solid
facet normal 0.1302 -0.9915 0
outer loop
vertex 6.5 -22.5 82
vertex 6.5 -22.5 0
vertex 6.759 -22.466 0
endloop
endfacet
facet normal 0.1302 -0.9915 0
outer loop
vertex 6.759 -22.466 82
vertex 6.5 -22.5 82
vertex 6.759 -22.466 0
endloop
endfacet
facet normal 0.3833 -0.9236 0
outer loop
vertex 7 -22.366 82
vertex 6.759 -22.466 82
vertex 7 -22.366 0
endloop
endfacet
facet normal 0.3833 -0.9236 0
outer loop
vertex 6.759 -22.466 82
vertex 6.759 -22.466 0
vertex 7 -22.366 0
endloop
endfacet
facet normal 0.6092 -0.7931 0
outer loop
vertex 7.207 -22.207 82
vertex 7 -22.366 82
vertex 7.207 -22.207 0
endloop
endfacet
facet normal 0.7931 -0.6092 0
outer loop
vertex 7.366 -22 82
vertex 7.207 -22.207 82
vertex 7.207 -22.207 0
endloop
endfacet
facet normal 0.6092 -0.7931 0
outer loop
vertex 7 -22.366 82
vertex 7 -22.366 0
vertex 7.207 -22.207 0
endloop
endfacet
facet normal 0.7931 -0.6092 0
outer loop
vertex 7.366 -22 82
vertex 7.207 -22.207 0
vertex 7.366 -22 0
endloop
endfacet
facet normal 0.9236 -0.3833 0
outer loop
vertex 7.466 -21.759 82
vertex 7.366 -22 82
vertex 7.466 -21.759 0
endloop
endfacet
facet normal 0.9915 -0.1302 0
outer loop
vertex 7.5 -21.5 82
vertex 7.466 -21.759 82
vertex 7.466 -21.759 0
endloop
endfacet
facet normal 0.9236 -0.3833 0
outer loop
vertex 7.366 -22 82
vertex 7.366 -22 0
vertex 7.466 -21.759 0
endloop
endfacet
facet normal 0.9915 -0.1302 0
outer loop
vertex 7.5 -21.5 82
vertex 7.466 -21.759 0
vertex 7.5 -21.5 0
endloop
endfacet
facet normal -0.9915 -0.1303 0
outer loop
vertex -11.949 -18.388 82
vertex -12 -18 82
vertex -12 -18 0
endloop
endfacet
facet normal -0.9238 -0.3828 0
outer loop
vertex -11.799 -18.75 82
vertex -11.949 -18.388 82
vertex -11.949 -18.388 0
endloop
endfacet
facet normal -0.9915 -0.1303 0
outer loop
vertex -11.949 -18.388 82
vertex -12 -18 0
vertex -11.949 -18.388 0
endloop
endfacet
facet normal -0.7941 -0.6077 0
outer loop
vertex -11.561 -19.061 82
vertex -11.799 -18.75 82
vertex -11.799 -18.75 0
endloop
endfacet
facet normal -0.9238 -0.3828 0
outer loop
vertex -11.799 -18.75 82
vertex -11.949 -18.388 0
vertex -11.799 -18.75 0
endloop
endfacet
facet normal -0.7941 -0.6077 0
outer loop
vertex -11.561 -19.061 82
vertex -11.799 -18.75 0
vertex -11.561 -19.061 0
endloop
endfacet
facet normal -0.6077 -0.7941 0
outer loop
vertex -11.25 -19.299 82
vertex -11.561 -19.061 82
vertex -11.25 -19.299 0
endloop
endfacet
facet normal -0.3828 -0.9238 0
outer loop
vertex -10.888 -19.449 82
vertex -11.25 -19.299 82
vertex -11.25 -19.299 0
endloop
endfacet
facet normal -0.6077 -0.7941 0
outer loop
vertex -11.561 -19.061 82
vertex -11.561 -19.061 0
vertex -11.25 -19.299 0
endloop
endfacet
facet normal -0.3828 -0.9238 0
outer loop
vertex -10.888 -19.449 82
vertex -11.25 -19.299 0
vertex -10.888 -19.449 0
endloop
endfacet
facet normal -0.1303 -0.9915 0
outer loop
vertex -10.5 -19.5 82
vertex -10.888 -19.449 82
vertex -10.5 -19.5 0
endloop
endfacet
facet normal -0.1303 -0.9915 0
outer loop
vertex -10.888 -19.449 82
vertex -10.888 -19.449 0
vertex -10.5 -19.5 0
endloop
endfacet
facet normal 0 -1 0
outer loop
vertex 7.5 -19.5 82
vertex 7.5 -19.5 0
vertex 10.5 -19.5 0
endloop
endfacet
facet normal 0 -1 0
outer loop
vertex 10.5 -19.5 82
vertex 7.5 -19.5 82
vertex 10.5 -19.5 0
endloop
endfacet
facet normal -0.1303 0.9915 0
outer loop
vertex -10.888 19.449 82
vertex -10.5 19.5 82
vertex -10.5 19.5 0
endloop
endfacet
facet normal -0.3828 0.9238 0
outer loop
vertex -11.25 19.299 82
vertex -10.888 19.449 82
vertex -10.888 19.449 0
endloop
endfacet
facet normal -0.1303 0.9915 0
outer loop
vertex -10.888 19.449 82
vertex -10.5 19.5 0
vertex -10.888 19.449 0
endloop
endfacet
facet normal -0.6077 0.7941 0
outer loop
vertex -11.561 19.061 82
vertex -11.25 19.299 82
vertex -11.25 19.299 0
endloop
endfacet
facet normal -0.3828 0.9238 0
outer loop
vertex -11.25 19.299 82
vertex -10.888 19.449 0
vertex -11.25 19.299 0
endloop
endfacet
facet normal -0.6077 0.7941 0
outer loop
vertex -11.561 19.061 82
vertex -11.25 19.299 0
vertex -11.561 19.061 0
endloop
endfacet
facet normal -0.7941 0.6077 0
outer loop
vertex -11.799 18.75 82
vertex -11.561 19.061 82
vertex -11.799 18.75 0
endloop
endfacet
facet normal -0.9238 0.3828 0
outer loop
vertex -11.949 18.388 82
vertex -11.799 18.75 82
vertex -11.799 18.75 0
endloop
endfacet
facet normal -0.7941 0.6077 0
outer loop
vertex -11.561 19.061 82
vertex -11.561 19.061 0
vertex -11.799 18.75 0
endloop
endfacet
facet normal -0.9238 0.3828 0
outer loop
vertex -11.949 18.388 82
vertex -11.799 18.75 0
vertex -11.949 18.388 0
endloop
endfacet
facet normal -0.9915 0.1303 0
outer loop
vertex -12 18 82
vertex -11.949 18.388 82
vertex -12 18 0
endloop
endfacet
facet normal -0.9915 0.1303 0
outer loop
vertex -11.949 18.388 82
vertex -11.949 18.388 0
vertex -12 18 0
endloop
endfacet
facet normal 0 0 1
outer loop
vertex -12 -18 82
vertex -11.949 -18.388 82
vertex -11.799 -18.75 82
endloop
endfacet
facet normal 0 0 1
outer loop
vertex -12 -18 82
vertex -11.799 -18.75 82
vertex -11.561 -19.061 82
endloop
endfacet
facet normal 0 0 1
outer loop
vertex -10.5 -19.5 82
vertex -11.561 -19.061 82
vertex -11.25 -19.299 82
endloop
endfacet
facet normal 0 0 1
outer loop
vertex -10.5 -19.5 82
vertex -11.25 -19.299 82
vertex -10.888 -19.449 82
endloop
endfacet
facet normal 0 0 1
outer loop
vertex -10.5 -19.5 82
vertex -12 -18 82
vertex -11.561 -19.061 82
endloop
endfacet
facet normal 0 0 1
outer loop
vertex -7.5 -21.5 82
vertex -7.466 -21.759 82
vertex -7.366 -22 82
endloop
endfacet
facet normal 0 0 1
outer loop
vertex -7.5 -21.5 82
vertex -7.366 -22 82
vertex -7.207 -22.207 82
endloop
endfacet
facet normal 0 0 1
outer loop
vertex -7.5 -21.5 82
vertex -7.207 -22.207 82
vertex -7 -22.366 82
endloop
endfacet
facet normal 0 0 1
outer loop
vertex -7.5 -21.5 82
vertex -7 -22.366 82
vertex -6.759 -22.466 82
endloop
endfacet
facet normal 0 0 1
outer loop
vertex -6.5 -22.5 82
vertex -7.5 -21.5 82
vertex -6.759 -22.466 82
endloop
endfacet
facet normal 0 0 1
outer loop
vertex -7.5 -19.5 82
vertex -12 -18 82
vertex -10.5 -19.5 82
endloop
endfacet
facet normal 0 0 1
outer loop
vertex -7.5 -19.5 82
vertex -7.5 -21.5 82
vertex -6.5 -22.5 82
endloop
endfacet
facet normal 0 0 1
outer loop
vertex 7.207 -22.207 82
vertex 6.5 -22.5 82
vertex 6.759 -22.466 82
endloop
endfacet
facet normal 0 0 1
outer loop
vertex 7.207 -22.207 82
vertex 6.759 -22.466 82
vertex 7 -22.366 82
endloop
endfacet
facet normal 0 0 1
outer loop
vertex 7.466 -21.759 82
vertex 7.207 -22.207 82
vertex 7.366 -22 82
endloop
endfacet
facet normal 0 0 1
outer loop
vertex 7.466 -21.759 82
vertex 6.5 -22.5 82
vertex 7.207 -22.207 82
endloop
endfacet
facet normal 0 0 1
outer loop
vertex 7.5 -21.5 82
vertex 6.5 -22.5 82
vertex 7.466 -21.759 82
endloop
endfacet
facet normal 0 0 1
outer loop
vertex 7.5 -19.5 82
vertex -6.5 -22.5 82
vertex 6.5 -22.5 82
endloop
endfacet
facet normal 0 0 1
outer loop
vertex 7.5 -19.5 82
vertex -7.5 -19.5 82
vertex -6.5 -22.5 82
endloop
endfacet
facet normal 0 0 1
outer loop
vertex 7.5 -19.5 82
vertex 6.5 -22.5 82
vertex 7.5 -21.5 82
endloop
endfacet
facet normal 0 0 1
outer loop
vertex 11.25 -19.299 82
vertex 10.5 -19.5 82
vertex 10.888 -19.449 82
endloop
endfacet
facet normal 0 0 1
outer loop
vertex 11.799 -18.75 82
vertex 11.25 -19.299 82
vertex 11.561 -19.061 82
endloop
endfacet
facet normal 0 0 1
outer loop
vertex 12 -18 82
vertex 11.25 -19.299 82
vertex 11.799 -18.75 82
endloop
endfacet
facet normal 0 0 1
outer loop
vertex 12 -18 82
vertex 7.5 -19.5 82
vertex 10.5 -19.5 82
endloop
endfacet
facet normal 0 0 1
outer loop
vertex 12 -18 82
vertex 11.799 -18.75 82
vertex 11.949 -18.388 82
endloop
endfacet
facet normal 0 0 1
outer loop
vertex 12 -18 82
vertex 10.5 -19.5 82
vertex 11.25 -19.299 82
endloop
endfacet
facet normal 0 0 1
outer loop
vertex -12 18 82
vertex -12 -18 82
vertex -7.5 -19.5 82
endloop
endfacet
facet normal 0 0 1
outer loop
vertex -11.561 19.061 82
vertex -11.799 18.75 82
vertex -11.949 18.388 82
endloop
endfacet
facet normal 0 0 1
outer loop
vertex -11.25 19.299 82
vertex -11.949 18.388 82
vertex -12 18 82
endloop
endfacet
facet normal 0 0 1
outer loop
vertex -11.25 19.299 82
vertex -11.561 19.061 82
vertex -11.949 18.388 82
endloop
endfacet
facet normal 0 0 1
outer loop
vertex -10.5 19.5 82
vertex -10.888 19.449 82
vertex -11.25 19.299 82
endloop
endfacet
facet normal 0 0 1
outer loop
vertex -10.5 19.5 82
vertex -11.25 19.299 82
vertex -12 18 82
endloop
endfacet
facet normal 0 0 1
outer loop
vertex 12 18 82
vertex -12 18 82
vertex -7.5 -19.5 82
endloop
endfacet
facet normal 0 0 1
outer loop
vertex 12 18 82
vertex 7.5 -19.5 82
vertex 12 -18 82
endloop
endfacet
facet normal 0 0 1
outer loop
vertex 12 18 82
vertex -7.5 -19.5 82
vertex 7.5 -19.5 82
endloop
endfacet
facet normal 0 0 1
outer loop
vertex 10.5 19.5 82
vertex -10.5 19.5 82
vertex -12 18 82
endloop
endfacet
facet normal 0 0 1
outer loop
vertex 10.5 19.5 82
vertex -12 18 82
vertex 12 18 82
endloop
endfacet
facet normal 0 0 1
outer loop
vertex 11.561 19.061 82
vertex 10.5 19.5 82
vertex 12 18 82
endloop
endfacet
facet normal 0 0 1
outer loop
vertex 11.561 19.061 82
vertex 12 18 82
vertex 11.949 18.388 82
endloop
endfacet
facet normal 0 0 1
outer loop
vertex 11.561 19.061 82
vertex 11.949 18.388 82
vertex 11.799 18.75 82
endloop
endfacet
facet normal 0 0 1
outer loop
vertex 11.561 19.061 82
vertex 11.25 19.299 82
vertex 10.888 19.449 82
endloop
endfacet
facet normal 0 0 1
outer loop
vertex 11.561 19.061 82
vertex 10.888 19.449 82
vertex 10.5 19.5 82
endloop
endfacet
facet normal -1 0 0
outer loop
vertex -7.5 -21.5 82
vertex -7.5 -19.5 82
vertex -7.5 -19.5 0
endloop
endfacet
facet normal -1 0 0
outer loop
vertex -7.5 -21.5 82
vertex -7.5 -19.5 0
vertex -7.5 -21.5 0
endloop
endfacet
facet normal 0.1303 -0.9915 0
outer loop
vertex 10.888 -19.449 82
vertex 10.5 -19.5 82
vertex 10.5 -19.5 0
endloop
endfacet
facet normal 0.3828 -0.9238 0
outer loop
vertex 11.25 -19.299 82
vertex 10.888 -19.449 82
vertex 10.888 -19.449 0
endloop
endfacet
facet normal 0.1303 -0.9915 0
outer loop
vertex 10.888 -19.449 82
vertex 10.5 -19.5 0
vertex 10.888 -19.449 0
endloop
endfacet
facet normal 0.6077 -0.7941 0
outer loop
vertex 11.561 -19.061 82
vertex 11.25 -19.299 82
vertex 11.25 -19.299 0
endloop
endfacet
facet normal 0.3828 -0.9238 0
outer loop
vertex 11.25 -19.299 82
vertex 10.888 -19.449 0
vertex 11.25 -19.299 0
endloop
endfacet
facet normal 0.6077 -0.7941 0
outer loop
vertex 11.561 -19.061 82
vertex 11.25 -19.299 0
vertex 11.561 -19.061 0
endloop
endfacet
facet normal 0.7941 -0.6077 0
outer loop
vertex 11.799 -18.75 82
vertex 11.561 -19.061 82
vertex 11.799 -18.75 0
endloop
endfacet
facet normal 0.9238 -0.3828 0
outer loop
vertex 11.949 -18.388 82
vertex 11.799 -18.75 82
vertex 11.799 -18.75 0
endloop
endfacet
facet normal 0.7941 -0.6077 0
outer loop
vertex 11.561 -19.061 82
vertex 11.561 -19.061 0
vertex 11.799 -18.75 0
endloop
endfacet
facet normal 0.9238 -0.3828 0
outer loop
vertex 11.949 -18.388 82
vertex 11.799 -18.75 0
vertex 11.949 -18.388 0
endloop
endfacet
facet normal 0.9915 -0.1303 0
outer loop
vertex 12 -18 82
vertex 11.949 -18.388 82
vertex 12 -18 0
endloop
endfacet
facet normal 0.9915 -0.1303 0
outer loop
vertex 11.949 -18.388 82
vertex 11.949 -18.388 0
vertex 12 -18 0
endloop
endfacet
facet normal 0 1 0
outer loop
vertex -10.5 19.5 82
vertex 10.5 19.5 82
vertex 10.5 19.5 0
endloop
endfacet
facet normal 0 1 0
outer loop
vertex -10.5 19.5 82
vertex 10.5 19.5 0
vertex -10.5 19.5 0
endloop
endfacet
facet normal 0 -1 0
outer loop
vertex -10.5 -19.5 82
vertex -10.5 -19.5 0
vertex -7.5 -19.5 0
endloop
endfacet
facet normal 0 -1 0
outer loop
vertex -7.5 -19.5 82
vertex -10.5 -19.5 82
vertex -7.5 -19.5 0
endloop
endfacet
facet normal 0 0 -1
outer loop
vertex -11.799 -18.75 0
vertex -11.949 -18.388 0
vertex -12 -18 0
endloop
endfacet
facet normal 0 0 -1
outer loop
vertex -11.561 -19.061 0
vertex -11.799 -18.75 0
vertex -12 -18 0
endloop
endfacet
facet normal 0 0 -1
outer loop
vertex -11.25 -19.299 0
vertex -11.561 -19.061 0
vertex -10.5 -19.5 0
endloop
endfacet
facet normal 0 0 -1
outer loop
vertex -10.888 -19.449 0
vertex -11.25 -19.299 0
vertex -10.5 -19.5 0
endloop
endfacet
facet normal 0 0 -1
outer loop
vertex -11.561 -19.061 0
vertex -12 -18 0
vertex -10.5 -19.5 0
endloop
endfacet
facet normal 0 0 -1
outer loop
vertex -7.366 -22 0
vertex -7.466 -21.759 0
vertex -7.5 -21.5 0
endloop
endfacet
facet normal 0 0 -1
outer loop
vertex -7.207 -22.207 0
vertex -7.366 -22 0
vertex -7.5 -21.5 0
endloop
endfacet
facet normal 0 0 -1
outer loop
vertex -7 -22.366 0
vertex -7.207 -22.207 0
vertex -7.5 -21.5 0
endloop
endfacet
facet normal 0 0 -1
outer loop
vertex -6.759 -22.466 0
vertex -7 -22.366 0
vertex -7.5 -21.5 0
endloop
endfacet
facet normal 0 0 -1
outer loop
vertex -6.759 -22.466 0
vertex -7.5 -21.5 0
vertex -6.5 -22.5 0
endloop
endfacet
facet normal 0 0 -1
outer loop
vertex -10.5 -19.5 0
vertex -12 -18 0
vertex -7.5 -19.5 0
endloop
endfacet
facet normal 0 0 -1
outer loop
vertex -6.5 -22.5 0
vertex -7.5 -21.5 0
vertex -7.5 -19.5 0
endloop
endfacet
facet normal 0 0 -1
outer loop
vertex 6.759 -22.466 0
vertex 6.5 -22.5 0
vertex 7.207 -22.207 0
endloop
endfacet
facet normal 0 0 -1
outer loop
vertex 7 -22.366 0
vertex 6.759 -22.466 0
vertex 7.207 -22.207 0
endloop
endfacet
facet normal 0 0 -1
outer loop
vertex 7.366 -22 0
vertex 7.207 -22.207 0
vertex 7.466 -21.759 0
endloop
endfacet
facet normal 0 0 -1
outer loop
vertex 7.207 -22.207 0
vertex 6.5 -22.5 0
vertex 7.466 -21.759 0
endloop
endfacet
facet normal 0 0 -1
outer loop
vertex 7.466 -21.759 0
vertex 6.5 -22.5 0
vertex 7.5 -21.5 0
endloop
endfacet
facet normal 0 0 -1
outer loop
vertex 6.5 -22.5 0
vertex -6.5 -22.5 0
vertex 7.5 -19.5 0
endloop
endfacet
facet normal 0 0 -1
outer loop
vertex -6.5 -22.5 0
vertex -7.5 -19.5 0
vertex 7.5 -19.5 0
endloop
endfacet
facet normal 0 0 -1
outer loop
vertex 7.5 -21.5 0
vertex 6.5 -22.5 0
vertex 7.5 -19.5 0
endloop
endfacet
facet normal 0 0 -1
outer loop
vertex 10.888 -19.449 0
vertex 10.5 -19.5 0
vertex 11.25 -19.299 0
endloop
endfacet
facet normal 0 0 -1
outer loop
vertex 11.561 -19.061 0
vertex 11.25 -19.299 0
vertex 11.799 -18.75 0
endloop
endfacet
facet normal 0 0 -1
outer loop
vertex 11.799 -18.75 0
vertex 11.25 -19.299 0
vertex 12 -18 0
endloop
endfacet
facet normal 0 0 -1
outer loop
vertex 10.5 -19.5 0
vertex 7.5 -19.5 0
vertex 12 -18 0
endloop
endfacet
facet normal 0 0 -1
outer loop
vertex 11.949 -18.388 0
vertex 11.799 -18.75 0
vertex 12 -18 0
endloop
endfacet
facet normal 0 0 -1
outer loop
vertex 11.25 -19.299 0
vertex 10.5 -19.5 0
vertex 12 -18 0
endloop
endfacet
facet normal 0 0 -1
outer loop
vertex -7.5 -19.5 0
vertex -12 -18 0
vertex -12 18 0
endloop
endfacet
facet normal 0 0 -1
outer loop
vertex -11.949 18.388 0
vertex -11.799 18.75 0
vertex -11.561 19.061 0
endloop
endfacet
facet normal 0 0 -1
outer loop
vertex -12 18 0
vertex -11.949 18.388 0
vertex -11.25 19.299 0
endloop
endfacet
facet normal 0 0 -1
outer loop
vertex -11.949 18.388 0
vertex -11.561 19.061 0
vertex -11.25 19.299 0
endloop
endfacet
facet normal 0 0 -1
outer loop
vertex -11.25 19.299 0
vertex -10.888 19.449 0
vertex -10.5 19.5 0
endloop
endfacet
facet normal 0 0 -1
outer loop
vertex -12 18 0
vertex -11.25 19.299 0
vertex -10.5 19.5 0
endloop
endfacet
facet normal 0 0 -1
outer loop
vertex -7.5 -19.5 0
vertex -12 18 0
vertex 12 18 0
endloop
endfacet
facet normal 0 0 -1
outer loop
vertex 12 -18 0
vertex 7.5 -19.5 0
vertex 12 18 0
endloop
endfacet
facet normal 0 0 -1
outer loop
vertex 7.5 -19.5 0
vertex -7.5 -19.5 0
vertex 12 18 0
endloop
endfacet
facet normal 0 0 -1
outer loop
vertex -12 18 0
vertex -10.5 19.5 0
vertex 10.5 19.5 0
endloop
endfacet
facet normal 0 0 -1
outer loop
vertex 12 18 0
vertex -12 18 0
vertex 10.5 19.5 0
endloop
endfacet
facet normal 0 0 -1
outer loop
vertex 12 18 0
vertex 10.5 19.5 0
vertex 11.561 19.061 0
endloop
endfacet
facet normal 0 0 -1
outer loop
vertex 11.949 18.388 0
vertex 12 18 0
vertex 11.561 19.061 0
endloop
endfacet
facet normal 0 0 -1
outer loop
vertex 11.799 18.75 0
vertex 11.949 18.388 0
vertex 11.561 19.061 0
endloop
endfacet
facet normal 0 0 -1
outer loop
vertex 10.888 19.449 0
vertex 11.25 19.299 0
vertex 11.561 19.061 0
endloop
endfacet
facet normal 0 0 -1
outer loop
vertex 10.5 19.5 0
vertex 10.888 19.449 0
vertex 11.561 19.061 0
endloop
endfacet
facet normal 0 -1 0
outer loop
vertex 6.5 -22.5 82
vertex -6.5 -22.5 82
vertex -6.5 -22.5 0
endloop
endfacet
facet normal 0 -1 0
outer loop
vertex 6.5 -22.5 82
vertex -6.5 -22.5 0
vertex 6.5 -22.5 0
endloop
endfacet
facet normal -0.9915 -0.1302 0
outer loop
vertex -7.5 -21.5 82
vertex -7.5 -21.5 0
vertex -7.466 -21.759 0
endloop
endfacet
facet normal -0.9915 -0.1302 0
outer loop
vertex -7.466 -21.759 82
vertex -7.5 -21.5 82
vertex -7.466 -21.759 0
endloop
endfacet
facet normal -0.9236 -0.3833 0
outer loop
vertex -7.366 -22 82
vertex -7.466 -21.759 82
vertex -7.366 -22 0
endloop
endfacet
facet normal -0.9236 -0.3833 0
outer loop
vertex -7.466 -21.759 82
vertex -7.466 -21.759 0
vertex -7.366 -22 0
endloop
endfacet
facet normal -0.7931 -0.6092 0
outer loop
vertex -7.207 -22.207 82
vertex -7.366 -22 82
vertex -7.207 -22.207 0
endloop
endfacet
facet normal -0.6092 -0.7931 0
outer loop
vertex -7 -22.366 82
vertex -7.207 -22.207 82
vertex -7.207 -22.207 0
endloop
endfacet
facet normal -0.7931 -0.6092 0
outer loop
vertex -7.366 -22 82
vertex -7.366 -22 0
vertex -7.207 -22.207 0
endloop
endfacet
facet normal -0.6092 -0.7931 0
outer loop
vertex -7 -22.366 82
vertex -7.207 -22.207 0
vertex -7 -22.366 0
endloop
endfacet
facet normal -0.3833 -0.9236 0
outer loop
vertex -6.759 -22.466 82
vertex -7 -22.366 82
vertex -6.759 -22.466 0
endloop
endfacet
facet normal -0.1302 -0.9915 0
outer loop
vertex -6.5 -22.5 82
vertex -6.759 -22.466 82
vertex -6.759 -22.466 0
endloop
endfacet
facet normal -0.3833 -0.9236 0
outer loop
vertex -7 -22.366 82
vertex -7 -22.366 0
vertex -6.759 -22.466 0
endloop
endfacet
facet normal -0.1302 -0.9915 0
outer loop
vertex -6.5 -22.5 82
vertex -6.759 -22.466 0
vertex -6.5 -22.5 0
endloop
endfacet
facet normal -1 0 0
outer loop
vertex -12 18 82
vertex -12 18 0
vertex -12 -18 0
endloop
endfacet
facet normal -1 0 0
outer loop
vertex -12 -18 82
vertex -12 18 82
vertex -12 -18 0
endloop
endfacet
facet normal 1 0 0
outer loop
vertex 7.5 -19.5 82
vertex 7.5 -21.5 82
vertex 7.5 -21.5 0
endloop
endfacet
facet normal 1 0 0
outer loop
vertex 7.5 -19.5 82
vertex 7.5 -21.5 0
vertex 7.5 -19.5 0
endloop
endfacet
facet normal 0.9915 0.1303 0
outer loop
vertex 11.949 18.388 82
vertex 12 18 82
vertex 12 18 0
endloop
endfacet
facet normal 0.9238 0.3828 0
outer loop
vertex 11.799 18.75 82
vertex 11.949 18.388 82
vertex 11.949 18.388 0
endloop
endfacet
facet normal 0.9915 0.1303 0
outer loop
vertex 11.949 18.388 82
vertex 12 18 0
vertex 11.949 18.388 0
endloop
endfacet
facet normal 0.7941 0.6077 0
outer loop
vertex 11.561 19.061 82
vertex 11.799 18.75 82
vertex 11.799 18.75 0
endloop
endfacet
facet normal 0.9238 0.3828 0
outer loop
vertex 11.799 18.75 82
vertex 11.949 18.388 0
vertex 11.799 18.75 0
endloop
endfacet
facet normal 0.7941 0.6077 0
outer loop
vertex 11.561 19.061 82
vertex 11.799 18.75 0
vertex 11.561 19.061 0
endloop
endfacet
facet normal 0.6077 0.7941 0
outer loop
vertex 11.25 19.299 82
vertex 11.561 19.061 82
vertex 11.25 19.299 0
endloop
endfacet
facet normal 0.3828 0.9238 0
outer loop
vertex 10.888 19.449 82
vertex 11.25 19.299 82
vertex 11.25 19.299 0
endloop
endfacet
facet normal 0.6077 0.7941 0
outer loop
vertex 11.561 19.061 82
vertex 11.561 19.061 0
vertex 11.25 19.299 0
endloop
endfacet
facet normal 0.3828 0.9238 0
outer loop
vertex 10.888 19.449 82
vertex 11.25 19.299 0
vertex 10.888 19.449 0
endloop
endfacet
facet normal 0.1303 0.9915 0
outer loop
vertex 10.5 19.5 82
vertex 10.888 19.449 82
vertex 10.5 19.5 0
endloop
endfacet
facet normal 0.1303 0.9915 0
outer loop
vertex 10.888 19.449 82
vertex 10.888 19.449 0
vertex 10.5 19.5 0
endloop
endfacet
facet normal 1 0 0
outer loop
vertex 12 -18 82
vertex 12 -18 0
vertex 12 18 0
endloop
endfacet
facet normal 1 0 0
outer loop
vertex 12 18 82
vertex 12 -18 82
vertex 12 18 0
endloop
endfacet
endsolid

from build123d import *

# Parameters (mm, degrees)
F1_DEPTH = 82


with BuildPart() as f1:
    # F0 (on Top) → F1 (new body)
    with BuildSketch(Plane.XY):
        with BuildLine():
            Line((10.5, 19.5), (-10.5, 19.5))
            ThreePointArc((-10.5, 19.5), (-11.56066, 19.06066), (-12, 18))
            Line((-12, 18), (-12, -18))
            ThreePointArc((-12, -18), (-11.56066, -19.06066), (-10.5, -19.5))
            Line((-10.5, -19.5), (-7.5, -19.5))
            Line((-7.5, -19.5), (-7.5, -21.5))
            ThreePointArc((-7.5, -21.5), (-7.207107, -22.207107), (-6.5, -22.5))
            Line((-6.5, -22.5), (6.5, -22.5))
            ThreePointArc((6.5, -22.5), (7.207107, -22.207107), (7.5, -21.5))
            Line((7.5, -21.5), (7.5, -19.5))
            Line((7.5, -19.5), (10.5, -19.5))
            ThreePointArc((10.5, -19.5), (11.56066, -19.06066), (12, -18))
            Line((12, -18), (12, 18))
            ThreePointArc((12, 18), (11.56066, 19.06066), (10.5, 19.5))
        make_face()
    extrude(amount=F1_DEPTH)


solid = f1.part
